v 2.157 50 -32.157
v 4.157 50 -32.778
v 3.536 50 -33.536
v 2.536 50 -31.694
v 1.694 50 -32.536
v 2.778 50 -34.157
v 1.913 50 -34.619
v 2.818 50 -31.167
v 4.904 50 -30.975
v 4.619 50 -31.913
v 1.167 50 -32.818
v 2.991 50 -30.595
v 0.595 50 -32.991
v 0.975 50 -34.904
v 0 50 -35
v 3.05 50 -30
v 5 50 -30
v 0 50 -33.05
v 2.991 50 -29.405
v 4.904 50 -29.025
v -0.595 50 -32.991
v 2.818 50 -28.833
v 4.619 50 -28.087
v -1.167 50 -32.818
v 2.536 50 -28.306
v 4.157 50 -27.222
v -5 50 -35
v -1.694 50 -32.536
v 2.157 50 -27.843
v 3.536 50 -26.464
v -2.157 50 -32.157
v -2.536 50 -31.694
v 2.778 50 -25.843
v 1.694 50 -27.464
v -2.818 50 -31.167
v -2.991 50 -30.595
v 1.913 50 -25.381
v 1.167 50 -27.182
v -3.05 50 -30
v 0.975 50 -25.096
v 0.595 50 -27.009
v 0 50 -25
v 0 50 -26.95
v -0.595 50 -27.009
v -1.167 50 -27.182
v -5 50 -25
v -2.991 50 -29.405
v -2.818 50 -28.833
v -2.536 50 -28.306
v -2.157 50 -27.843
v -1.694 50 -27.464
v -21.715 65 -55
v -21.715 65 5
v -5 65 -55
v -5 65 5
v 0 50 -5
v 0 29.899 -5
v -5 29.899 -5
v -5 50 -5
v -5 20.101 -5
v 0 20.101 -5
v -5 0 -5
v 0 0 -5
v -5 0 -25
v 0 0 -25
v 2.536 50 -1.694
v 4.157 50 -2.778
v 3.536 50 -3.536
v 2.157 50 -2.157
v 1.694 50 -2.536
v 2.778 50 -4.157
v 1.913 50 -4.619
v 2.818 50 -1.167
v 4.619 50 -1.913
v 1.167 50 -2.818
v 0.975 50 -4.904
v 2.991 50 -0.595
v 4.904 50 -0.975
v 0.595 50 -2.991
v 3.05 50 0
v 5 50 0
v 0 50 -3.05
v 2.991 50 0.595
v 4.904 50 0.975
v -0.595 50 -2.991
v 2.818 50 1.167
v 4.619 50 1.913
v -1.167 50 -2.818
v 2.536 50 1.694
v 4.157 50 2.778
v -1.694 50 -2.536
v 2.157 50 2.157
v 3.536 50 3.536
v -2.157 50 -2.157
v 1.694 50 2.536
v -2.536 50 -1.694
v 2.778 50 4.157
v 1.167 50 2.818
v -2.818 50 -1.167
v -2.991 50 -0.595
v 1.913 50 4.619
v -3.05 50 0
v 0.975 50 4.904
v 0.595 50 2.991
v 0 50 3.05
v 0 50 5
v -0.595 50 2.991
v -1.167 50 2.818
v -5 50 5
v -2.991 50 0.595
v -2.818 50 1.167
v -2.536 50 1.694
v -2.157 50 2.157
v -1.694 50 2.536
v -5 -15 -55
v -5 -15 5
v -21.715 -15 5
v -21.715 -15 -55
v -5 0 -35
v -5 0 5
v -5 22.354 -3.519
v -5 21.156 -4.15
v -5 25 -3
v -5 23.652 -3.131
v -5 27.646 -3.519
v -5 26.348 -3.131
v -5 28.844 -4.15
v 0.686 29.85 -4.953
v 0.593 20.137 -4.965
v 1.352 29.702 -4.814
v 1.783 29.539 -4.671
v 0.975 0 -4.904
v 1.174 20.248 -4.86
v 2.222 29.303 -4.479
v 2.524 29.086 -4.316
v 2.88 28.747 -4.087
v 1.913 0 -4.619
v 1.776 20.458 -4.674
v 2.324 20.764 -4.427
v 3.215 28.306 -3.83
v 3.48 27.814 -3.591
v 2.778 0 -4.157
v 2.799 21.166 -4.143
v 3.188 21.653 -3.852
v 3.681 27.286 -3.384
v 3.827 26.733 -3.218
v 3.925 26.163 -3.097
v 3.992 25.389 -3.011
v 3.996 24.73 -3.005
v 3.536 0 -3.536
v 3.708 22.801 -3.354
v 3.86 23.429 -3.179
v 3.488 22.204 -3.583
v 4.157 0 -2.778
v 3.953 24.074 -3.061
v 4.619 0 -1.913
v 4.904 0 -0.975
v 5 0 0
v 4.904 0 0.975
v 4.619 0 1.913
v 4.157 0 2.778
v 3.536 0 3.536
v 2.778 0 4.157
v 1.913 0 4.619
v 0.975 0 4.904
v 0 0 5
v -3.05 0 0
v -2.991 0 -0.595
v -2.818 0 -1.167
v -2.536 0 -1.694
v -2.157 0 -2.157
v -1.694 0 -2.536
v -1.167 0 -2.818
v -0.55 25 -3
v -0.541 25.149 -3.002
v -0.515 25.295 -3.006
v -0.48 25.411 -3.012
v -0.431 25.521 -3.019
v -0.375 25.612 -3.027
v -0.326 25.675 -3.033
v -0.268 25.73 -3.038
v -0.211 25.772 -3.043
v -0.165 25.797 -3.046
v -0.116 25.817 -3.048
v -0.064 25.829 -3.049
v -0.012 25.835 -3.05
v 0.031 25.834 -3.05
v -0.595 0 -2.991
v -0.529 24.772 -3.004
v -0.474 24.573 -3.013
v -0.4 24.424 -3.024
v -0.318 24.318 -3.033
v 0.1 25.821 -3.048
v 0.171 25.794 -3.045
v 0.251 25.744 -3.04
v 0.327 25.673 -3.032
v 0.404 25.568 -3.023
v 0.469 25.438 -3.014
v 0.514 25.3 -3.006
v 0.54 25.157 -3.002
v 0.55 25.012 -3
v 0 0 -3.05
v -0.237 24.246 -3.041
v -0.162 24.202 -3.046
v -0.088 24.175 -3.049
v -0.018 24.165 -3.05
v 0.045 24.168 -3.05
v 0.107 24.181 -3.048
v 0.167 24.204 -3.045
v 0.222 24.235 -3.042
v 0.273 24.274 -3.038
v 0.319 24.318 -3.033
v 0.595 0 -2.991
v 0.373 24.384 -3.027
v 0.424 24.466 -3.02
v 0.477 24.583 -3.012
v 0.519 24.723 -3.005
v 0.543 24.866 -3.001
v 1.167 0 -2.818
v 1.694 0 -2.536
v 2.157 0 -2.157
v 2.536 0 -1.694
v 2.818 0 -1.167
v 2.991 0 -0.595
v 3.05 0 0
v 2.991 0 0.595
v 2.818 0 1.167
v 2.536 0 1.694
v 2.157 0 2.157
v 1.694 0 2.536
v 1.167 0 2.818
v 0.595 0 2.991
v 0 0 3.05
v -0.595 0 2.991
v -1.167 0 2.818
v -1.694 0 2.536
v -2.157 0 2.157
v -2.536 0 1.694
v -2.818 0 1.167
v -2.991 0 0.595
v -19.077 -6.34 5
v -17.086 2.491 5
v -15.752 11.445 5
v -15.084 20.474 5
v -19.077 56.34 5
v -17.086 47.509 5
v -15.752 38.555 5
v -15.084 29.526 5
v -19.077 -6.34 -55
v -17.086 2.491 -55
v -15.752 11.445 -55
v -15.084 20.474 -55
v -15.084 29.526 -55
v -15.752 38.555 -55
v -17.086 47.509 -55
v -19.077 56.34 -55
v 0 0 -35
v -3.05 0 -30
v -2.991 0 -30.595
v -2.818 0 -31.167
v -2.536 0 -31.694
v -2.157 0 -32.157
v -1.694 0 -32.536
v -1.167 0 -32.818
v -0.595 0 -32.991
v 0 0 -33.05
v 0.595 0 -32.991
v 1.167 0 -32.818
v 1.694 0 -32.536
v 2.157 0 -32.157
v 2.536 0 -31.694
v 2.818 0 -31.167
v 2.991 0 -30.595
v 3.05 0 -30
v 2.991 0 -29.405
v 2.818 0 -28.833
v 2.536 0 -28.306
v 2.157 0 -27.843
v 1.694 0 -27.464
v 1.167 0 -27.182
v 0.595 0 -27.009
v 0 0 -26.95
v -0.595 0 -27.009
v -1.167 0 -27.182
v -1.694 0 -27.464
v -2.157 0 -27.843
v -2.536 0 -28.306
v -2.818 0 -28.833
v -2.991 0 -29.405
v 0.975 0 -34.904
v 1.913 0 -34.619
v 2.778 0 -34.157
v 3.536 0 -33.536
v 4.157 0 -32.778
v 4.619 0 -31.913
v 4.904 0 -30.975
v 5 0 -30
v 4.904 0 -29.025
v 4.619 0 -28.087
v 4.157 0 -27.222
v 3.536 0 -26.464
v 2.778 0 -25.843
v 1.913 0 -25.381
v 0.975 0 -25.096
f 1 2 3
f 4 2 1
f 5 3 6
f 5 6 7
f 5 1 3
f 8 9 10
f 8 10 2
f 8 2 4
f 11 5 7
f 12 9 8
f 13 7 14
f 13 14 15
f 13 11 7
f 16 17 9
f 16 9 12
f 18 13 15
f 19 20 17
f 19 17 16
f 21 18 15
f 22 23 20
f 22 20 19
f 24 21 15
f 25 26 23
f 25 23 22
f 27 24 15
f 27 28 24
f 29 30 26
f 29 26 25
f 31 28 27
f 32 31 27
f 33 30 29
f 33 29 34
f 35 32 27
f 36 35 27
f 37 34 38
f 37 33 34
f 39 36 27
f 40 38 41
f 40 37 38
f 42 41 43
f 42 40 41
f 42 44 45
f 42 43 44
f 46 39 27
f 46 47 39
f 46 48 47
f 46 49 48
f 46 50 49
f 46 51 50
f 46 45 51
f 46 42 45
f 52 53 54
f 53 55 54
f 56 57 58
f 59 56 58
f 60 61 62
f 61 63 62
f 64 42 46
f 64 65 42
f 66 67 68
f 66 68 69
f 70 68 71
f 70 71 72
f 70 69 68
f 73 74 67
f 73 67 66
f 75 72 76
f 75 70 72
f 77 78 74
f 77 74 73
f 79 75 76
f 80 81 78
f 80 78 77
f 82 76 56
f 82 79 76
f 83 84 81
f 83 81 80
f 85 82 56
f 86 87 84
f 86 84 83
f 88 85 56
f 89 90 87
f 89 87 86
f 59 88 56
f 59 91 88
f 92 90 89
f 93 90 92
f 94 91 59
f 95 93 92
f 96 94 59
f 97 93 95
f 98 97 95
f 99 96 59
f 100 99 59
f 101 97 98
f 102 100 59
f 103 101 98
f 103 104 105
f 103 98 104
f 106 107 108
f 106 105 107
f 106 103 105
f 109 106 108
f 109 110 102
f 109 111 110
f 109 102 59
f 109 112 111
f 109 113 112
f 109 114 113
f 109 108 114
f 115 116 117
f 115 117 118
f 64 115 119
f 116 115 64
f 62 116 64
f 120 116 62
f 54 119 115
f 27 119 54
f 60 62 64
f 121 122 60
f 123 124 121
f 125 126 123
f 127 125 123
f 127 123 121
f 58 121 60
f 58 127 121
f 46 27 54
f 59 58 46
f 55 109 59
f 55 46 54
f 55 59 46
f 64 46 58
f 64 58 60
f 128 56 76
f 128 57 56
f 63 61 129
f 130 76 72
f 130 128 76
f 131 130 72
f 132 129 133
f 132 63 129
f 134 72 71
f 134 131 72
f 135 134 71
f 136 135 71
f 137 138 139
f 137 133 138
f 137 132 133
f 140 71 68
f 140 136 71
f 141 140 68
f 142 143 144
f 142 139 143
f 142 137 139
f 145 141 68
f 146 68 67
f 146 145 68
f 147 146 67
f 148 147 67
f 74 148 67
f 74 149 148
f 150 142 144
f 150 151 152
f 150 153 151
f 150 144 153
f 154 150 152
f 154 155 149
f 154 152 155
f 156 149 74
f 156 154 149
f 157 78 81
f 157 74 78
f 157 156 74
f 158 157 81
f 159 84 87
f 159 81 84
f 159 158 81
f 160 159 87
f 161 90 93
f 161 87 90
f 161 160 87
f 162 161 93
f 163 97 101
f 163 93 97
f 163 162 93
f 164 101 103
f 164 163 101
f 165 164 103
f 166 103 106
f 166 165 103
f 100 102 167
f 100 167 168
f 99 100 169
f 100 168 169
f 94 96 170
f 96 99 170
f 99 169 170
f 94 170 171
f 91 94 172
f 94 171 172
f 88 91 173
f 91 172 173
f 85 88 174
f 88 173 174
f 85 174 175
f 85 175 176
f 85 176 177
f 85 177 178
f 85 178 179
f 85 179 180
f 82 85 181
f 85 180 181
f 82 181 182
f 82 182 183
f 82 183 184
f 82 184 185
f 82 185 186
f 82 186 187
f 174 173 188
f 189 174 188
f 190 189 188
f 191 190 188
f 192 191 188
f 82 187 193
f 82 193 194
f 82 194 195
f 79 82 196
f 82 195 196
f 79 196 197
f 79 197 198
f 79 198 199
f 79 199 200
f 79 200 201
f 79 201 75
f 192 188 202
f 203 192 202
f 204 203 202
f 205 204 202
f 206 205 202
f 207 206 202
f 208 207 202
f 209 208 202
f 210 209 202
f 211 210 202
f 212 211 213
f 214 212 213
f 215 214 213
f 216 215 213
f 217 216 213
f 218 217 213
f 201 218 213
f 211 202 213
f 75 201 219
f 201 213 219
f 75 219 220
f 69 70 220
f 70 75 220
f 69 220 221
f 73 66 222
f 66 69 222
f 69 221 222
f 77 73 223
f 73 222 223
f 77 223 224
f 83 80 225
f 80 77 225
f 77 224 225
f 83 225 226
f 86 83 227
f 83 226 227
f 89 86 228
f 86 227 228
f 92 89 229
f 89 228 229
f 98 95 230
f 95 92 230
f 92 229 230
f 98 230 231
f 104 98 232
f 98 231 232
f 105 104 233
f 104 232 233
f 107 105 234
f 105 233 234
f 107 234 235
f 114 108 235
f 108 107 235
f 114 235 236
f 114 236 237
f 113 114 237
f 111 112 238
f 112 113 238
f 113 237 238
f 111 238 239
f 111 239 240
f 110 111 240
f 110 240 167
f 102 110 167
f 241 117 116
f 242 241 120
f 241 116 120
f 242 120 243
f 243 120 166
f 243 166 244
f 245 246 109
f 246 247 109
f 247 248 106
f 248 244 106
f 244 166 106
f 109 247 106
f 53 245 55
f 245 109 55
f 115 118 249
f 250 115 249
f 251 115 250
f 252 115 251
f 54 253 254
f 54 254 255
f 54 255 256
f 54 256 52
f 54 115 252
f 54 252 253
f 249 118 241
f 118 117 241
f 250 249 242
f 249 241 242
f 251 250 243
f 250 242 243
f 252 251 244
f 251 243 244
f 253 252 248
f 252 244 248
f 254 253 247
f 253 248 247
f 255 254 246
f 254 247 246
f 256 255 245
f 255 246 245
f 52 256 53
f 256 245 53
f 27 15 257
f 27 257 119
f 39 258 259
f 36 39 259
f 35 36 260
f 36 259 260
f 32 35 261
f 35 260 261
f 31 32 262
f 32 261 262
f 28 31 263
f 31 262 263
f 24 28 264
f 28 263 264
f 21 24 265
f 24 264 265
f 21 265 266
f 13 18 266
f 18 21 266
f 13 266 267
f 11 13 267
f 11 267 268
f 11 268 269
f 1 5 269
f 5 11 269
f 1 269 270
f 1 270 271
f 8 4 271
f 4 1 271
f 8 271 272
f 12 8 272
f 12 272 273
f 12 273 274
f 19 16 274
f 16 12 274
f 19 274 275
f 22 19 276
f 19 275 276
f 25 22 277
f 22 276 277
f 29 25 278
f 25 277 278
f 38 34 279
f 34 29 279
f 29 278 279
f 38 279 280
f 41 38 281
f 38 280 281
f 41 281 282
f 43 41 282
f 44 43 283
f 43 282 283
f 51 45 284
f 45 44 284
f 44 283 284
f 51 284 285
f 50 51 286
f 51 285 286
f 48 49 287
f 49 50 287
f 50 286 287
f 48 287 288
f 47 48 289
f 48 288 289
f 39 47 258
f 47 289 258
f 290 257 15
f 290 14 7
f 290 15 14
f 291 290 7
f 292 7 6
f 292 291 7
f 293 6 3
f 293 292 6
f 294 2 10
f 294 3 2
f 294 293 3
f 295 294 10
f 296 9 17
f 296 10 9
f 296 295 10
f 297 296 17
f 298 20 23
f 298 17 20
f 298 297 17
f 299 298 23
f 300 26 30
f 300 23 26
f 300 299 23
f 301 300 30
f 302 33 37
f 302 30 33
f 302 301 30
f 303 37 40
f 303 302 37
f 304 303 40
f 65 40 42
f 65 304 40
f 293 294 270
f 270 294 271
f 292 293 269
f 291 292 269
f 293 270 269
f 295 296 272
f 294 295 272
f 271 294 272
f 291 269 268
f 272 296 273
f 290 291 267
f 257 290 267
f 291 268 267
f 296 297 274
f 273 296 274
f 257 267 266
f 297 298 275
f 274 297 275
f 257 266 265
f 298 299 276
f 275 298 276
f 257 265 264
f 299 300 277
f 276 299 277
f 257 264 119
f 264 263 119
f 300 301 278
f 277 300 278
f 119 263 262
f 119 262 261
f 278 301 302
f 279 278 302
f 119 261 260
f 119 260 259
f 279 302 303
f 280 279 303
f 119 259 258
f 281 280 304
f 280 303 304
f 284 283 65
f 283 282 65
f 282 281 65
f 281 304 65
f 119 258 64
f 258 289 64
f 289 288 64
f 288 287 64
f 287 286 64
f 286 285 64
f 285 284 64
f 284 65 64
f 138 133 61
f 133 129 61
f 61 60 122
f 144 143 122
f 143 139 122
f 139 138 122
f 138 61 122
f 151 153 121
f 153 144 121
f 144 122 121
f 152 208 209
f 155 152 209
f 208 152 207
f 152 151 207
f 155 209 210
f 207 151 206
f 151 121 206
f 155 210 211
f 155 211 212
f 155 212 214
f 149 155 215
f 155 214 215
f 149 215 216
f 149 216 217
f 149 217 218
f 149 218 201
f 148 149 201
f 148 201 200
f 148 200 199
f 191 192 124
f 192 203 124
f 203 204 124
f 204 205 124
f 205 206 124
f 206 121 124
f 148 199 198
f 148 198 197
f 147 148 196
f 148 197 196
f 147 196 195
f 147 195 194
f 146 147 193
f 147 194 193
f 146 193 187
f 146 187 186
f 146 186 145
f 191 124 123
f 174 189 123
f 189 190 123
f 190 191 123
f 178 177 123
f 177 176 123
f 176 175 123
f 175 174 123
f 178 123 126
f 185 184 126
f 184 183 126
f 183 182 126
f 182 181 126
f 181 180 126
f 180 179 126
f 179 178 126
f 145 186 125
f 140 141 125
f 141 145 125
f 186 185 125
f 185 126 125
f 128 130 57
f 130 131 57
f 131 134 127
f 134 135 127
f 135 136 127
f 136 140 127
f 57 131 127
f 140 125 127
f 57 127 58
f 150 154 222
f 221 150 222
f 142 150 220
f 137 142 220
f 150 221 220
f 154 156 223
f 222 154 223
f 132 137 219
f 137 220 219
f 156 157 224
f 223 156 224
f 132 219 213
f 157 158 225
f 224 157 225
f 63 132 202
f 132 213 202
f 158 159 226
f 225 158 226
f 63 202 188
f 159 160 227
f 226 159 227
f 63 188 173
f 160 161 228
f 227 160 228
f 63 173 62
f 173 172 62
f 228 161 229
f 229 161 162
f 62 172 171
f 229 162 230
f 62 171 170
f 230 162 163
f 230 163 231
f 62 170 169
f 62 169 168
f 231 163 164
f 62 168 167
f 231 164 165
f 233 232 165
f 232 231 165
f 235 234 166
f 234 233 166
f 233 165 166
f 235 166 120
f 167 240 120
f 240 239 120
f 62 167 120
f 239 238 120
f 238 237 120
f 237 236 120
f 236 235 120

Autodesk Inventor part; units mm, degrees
ref_plane "YZ Plane" through (0, 0, 0) normal (1, 0, 0) x (0, 1, 0)
ref_plane "XZ Plane" through (0, 0, 0) normal (0, 1, 0) x (-1, 0, 0)
sketch "スケッチ1" plane through (0, 0, 0) normal (0, 1, 0) x (-1, 0, 0)
  line L0 (0, 0) -> (0, -30)
  circle A0 centre (0, 0) radius 3.05
  circle A1 centre (0, -30) radius 3.05
  circle A2 centre (0, 0) radius 5
  circle A3 centre (0, -30) radius 5
  line L1 (5, 0) -> (5, -30)
  line L2 (0, -5) -> (5, -5)
  line L3 (0, -25) -> (5, -25)
  line L4 (0, 5) -> (5, 5)
  line L5 (5, 5) -> (5, 0)
  line L6 (0, -35) -> (5, -35)
  line L7 (5, -35) -> (5, -30)
  line L8 (5, 5) -> (10, 5)
  line L9 (10, 5) -> (10, -35)
  line L10 (10, -35) -> (5, -35)
  line L11 (5, -35) -> (5, 5)
  dimension "d0" = 30
  dimension "d1" = 6.1
  dimension "d2" = 6.1
  dimension "d3" = 10
  dimension "d4" = 10
  dimension "d5" = 5
  dimension "d6" = 40
extrude "押し出し1" add sketch "スケッチ1" along normal blind 50 contours A2 | A2 L1 L2 | L3 L1 A3 | A3 | L4 L5 A2 | L5 L8 L9 L10 L7 L1 | L7 L6 A3
sketch "スケッチ2" plane through (0, 50, 0) normal (0, 1, 0) x (1, 0, 0)
  line L0 (-10, 35) -> (-10, -5) projected
  line L1 (0, 35) -> (-10, 35) projected
  line L2 (-10, -5) -> (-5, -5)
  line L3 (-5, -5) -> (-5, 35)
  line L4 (-5, 35) -> (-10, 35)
  line L5 (-10, 35) -> (-10, -5)
  point P0 (0, 0)
extrude "押し出し2" add sketch "スケッチ2" along normal blind 15
sketch "スケッチ3" plane through (0, 0, 0) normal (0, -1, 0) x (1, 0, 0)
  line L0 (-10, 5) -> (0, 5) projected
  line L1 (-5, -35) -> (-5, -25) projected
  line L2 (-10, 5) -> (-5, 5)
  line L3 (-5, 5) -> (-5, -35)
  line L4 (-5, -35) -> (-10, -35)
  line L5 (-10, -35) -> (-10, 5)
  point P0 (0, 0)
extrude "押し出し3" add sketch "スケッチ3" along normal blind 15
sketch "スケッチ4" plane through (-5, 0, -25) normal (1, 0, 0) x (0, 0, -1)
  circle A0 centre (-15, 25) radius 7
  line L0 (-30, 0) -> (-30, 50) projected
  line L1 (-20, 0) -> (-30, 0) projected
  point P0 (-25, 0)
  dimension "d13" = 14
  dimension "d14" = 15
  dimension "d15" = 25
extrude "押し出し4" cut sketch "スケッチ4" along normal blind 50
sketch "スケッチ5" plane through (0, 0, -35) normal (0, 0, -1) x (-1, 0, 0)
  line L0 (10, -15) -> (10, 65) projected
  line L1 (10, 65) -> (5, 65) projected
  line L2 (10, -15) -> (5, -15)
  line L3 (5, -15) -> (5, 65)
  line L4 (5, 65) -> (10, 65)
  line L5 (10, 65) -> (10, -15)
  point P0 (0, 0)
extrude "押し出し5" add sketch "スケッチ5" along normal blind 20
ref_plane "作業平面1" through (-10, -13, 5) normal (-1, 0, 0) x (0, 0, 1)
sketch "スケッチ6" plane through (-10, -13, 5) normal (-1, 0, 0) x (0, 0, 1)
  line L0 (0, -2) -> (0, 78) projected
  line L1 (0, 78) -> (-60, 78) projected
  line L2 (-60, -2) -> (-60, 78) projected
  line L3 (0, -2) -> (-60, -2) projected
  point P0 (-5, 13)
extrude "押し出し6" add sketch "スケッチ6" along normal blind 5
sketch "スケッチ7" plane through (-5, 0, 5) normal (0, 0, 1) x (1, 0, 0)
  line L0 (-10, 63) -> (-10, -13) projected
  line L1 (-10, 25) -> (-132.5, 25)
  circle A0 centre (-132.5, 25) radius 122.5
  line L2 (-10, 65) -> (-16.7146, 65)
  line L3 (0, -15) -> (-10, -15) projected
  line L4 (-10, -15) -> (-16.7146, -15)
  line L5 (0, 0) -> (5, 0) projected
  line L6 (5, 0) -> (5, 50) projected
  line L7 (0, 50) -> (5, 50) projected
  line L8 (0, 50) -> (0, 65) projected
  line L9 (0, 65) -> (-10, 65) projected
  line L10 (-10, -15) -> (-10, 65) projected
  line L11 (0, -15) -> (-10, -15) projected
  line L12 (0, 0) -> (0, -15) projected
  dimension "d23" = 122.5
  dimension "d24" = 180
extrude "押し出し7" add sketch "スケッチ7" against normal blind 60 contours L0 A0 L2 L10 | L0 L10 L4 A0
properties part number "hand2_13" material "ABS プラスチック"
